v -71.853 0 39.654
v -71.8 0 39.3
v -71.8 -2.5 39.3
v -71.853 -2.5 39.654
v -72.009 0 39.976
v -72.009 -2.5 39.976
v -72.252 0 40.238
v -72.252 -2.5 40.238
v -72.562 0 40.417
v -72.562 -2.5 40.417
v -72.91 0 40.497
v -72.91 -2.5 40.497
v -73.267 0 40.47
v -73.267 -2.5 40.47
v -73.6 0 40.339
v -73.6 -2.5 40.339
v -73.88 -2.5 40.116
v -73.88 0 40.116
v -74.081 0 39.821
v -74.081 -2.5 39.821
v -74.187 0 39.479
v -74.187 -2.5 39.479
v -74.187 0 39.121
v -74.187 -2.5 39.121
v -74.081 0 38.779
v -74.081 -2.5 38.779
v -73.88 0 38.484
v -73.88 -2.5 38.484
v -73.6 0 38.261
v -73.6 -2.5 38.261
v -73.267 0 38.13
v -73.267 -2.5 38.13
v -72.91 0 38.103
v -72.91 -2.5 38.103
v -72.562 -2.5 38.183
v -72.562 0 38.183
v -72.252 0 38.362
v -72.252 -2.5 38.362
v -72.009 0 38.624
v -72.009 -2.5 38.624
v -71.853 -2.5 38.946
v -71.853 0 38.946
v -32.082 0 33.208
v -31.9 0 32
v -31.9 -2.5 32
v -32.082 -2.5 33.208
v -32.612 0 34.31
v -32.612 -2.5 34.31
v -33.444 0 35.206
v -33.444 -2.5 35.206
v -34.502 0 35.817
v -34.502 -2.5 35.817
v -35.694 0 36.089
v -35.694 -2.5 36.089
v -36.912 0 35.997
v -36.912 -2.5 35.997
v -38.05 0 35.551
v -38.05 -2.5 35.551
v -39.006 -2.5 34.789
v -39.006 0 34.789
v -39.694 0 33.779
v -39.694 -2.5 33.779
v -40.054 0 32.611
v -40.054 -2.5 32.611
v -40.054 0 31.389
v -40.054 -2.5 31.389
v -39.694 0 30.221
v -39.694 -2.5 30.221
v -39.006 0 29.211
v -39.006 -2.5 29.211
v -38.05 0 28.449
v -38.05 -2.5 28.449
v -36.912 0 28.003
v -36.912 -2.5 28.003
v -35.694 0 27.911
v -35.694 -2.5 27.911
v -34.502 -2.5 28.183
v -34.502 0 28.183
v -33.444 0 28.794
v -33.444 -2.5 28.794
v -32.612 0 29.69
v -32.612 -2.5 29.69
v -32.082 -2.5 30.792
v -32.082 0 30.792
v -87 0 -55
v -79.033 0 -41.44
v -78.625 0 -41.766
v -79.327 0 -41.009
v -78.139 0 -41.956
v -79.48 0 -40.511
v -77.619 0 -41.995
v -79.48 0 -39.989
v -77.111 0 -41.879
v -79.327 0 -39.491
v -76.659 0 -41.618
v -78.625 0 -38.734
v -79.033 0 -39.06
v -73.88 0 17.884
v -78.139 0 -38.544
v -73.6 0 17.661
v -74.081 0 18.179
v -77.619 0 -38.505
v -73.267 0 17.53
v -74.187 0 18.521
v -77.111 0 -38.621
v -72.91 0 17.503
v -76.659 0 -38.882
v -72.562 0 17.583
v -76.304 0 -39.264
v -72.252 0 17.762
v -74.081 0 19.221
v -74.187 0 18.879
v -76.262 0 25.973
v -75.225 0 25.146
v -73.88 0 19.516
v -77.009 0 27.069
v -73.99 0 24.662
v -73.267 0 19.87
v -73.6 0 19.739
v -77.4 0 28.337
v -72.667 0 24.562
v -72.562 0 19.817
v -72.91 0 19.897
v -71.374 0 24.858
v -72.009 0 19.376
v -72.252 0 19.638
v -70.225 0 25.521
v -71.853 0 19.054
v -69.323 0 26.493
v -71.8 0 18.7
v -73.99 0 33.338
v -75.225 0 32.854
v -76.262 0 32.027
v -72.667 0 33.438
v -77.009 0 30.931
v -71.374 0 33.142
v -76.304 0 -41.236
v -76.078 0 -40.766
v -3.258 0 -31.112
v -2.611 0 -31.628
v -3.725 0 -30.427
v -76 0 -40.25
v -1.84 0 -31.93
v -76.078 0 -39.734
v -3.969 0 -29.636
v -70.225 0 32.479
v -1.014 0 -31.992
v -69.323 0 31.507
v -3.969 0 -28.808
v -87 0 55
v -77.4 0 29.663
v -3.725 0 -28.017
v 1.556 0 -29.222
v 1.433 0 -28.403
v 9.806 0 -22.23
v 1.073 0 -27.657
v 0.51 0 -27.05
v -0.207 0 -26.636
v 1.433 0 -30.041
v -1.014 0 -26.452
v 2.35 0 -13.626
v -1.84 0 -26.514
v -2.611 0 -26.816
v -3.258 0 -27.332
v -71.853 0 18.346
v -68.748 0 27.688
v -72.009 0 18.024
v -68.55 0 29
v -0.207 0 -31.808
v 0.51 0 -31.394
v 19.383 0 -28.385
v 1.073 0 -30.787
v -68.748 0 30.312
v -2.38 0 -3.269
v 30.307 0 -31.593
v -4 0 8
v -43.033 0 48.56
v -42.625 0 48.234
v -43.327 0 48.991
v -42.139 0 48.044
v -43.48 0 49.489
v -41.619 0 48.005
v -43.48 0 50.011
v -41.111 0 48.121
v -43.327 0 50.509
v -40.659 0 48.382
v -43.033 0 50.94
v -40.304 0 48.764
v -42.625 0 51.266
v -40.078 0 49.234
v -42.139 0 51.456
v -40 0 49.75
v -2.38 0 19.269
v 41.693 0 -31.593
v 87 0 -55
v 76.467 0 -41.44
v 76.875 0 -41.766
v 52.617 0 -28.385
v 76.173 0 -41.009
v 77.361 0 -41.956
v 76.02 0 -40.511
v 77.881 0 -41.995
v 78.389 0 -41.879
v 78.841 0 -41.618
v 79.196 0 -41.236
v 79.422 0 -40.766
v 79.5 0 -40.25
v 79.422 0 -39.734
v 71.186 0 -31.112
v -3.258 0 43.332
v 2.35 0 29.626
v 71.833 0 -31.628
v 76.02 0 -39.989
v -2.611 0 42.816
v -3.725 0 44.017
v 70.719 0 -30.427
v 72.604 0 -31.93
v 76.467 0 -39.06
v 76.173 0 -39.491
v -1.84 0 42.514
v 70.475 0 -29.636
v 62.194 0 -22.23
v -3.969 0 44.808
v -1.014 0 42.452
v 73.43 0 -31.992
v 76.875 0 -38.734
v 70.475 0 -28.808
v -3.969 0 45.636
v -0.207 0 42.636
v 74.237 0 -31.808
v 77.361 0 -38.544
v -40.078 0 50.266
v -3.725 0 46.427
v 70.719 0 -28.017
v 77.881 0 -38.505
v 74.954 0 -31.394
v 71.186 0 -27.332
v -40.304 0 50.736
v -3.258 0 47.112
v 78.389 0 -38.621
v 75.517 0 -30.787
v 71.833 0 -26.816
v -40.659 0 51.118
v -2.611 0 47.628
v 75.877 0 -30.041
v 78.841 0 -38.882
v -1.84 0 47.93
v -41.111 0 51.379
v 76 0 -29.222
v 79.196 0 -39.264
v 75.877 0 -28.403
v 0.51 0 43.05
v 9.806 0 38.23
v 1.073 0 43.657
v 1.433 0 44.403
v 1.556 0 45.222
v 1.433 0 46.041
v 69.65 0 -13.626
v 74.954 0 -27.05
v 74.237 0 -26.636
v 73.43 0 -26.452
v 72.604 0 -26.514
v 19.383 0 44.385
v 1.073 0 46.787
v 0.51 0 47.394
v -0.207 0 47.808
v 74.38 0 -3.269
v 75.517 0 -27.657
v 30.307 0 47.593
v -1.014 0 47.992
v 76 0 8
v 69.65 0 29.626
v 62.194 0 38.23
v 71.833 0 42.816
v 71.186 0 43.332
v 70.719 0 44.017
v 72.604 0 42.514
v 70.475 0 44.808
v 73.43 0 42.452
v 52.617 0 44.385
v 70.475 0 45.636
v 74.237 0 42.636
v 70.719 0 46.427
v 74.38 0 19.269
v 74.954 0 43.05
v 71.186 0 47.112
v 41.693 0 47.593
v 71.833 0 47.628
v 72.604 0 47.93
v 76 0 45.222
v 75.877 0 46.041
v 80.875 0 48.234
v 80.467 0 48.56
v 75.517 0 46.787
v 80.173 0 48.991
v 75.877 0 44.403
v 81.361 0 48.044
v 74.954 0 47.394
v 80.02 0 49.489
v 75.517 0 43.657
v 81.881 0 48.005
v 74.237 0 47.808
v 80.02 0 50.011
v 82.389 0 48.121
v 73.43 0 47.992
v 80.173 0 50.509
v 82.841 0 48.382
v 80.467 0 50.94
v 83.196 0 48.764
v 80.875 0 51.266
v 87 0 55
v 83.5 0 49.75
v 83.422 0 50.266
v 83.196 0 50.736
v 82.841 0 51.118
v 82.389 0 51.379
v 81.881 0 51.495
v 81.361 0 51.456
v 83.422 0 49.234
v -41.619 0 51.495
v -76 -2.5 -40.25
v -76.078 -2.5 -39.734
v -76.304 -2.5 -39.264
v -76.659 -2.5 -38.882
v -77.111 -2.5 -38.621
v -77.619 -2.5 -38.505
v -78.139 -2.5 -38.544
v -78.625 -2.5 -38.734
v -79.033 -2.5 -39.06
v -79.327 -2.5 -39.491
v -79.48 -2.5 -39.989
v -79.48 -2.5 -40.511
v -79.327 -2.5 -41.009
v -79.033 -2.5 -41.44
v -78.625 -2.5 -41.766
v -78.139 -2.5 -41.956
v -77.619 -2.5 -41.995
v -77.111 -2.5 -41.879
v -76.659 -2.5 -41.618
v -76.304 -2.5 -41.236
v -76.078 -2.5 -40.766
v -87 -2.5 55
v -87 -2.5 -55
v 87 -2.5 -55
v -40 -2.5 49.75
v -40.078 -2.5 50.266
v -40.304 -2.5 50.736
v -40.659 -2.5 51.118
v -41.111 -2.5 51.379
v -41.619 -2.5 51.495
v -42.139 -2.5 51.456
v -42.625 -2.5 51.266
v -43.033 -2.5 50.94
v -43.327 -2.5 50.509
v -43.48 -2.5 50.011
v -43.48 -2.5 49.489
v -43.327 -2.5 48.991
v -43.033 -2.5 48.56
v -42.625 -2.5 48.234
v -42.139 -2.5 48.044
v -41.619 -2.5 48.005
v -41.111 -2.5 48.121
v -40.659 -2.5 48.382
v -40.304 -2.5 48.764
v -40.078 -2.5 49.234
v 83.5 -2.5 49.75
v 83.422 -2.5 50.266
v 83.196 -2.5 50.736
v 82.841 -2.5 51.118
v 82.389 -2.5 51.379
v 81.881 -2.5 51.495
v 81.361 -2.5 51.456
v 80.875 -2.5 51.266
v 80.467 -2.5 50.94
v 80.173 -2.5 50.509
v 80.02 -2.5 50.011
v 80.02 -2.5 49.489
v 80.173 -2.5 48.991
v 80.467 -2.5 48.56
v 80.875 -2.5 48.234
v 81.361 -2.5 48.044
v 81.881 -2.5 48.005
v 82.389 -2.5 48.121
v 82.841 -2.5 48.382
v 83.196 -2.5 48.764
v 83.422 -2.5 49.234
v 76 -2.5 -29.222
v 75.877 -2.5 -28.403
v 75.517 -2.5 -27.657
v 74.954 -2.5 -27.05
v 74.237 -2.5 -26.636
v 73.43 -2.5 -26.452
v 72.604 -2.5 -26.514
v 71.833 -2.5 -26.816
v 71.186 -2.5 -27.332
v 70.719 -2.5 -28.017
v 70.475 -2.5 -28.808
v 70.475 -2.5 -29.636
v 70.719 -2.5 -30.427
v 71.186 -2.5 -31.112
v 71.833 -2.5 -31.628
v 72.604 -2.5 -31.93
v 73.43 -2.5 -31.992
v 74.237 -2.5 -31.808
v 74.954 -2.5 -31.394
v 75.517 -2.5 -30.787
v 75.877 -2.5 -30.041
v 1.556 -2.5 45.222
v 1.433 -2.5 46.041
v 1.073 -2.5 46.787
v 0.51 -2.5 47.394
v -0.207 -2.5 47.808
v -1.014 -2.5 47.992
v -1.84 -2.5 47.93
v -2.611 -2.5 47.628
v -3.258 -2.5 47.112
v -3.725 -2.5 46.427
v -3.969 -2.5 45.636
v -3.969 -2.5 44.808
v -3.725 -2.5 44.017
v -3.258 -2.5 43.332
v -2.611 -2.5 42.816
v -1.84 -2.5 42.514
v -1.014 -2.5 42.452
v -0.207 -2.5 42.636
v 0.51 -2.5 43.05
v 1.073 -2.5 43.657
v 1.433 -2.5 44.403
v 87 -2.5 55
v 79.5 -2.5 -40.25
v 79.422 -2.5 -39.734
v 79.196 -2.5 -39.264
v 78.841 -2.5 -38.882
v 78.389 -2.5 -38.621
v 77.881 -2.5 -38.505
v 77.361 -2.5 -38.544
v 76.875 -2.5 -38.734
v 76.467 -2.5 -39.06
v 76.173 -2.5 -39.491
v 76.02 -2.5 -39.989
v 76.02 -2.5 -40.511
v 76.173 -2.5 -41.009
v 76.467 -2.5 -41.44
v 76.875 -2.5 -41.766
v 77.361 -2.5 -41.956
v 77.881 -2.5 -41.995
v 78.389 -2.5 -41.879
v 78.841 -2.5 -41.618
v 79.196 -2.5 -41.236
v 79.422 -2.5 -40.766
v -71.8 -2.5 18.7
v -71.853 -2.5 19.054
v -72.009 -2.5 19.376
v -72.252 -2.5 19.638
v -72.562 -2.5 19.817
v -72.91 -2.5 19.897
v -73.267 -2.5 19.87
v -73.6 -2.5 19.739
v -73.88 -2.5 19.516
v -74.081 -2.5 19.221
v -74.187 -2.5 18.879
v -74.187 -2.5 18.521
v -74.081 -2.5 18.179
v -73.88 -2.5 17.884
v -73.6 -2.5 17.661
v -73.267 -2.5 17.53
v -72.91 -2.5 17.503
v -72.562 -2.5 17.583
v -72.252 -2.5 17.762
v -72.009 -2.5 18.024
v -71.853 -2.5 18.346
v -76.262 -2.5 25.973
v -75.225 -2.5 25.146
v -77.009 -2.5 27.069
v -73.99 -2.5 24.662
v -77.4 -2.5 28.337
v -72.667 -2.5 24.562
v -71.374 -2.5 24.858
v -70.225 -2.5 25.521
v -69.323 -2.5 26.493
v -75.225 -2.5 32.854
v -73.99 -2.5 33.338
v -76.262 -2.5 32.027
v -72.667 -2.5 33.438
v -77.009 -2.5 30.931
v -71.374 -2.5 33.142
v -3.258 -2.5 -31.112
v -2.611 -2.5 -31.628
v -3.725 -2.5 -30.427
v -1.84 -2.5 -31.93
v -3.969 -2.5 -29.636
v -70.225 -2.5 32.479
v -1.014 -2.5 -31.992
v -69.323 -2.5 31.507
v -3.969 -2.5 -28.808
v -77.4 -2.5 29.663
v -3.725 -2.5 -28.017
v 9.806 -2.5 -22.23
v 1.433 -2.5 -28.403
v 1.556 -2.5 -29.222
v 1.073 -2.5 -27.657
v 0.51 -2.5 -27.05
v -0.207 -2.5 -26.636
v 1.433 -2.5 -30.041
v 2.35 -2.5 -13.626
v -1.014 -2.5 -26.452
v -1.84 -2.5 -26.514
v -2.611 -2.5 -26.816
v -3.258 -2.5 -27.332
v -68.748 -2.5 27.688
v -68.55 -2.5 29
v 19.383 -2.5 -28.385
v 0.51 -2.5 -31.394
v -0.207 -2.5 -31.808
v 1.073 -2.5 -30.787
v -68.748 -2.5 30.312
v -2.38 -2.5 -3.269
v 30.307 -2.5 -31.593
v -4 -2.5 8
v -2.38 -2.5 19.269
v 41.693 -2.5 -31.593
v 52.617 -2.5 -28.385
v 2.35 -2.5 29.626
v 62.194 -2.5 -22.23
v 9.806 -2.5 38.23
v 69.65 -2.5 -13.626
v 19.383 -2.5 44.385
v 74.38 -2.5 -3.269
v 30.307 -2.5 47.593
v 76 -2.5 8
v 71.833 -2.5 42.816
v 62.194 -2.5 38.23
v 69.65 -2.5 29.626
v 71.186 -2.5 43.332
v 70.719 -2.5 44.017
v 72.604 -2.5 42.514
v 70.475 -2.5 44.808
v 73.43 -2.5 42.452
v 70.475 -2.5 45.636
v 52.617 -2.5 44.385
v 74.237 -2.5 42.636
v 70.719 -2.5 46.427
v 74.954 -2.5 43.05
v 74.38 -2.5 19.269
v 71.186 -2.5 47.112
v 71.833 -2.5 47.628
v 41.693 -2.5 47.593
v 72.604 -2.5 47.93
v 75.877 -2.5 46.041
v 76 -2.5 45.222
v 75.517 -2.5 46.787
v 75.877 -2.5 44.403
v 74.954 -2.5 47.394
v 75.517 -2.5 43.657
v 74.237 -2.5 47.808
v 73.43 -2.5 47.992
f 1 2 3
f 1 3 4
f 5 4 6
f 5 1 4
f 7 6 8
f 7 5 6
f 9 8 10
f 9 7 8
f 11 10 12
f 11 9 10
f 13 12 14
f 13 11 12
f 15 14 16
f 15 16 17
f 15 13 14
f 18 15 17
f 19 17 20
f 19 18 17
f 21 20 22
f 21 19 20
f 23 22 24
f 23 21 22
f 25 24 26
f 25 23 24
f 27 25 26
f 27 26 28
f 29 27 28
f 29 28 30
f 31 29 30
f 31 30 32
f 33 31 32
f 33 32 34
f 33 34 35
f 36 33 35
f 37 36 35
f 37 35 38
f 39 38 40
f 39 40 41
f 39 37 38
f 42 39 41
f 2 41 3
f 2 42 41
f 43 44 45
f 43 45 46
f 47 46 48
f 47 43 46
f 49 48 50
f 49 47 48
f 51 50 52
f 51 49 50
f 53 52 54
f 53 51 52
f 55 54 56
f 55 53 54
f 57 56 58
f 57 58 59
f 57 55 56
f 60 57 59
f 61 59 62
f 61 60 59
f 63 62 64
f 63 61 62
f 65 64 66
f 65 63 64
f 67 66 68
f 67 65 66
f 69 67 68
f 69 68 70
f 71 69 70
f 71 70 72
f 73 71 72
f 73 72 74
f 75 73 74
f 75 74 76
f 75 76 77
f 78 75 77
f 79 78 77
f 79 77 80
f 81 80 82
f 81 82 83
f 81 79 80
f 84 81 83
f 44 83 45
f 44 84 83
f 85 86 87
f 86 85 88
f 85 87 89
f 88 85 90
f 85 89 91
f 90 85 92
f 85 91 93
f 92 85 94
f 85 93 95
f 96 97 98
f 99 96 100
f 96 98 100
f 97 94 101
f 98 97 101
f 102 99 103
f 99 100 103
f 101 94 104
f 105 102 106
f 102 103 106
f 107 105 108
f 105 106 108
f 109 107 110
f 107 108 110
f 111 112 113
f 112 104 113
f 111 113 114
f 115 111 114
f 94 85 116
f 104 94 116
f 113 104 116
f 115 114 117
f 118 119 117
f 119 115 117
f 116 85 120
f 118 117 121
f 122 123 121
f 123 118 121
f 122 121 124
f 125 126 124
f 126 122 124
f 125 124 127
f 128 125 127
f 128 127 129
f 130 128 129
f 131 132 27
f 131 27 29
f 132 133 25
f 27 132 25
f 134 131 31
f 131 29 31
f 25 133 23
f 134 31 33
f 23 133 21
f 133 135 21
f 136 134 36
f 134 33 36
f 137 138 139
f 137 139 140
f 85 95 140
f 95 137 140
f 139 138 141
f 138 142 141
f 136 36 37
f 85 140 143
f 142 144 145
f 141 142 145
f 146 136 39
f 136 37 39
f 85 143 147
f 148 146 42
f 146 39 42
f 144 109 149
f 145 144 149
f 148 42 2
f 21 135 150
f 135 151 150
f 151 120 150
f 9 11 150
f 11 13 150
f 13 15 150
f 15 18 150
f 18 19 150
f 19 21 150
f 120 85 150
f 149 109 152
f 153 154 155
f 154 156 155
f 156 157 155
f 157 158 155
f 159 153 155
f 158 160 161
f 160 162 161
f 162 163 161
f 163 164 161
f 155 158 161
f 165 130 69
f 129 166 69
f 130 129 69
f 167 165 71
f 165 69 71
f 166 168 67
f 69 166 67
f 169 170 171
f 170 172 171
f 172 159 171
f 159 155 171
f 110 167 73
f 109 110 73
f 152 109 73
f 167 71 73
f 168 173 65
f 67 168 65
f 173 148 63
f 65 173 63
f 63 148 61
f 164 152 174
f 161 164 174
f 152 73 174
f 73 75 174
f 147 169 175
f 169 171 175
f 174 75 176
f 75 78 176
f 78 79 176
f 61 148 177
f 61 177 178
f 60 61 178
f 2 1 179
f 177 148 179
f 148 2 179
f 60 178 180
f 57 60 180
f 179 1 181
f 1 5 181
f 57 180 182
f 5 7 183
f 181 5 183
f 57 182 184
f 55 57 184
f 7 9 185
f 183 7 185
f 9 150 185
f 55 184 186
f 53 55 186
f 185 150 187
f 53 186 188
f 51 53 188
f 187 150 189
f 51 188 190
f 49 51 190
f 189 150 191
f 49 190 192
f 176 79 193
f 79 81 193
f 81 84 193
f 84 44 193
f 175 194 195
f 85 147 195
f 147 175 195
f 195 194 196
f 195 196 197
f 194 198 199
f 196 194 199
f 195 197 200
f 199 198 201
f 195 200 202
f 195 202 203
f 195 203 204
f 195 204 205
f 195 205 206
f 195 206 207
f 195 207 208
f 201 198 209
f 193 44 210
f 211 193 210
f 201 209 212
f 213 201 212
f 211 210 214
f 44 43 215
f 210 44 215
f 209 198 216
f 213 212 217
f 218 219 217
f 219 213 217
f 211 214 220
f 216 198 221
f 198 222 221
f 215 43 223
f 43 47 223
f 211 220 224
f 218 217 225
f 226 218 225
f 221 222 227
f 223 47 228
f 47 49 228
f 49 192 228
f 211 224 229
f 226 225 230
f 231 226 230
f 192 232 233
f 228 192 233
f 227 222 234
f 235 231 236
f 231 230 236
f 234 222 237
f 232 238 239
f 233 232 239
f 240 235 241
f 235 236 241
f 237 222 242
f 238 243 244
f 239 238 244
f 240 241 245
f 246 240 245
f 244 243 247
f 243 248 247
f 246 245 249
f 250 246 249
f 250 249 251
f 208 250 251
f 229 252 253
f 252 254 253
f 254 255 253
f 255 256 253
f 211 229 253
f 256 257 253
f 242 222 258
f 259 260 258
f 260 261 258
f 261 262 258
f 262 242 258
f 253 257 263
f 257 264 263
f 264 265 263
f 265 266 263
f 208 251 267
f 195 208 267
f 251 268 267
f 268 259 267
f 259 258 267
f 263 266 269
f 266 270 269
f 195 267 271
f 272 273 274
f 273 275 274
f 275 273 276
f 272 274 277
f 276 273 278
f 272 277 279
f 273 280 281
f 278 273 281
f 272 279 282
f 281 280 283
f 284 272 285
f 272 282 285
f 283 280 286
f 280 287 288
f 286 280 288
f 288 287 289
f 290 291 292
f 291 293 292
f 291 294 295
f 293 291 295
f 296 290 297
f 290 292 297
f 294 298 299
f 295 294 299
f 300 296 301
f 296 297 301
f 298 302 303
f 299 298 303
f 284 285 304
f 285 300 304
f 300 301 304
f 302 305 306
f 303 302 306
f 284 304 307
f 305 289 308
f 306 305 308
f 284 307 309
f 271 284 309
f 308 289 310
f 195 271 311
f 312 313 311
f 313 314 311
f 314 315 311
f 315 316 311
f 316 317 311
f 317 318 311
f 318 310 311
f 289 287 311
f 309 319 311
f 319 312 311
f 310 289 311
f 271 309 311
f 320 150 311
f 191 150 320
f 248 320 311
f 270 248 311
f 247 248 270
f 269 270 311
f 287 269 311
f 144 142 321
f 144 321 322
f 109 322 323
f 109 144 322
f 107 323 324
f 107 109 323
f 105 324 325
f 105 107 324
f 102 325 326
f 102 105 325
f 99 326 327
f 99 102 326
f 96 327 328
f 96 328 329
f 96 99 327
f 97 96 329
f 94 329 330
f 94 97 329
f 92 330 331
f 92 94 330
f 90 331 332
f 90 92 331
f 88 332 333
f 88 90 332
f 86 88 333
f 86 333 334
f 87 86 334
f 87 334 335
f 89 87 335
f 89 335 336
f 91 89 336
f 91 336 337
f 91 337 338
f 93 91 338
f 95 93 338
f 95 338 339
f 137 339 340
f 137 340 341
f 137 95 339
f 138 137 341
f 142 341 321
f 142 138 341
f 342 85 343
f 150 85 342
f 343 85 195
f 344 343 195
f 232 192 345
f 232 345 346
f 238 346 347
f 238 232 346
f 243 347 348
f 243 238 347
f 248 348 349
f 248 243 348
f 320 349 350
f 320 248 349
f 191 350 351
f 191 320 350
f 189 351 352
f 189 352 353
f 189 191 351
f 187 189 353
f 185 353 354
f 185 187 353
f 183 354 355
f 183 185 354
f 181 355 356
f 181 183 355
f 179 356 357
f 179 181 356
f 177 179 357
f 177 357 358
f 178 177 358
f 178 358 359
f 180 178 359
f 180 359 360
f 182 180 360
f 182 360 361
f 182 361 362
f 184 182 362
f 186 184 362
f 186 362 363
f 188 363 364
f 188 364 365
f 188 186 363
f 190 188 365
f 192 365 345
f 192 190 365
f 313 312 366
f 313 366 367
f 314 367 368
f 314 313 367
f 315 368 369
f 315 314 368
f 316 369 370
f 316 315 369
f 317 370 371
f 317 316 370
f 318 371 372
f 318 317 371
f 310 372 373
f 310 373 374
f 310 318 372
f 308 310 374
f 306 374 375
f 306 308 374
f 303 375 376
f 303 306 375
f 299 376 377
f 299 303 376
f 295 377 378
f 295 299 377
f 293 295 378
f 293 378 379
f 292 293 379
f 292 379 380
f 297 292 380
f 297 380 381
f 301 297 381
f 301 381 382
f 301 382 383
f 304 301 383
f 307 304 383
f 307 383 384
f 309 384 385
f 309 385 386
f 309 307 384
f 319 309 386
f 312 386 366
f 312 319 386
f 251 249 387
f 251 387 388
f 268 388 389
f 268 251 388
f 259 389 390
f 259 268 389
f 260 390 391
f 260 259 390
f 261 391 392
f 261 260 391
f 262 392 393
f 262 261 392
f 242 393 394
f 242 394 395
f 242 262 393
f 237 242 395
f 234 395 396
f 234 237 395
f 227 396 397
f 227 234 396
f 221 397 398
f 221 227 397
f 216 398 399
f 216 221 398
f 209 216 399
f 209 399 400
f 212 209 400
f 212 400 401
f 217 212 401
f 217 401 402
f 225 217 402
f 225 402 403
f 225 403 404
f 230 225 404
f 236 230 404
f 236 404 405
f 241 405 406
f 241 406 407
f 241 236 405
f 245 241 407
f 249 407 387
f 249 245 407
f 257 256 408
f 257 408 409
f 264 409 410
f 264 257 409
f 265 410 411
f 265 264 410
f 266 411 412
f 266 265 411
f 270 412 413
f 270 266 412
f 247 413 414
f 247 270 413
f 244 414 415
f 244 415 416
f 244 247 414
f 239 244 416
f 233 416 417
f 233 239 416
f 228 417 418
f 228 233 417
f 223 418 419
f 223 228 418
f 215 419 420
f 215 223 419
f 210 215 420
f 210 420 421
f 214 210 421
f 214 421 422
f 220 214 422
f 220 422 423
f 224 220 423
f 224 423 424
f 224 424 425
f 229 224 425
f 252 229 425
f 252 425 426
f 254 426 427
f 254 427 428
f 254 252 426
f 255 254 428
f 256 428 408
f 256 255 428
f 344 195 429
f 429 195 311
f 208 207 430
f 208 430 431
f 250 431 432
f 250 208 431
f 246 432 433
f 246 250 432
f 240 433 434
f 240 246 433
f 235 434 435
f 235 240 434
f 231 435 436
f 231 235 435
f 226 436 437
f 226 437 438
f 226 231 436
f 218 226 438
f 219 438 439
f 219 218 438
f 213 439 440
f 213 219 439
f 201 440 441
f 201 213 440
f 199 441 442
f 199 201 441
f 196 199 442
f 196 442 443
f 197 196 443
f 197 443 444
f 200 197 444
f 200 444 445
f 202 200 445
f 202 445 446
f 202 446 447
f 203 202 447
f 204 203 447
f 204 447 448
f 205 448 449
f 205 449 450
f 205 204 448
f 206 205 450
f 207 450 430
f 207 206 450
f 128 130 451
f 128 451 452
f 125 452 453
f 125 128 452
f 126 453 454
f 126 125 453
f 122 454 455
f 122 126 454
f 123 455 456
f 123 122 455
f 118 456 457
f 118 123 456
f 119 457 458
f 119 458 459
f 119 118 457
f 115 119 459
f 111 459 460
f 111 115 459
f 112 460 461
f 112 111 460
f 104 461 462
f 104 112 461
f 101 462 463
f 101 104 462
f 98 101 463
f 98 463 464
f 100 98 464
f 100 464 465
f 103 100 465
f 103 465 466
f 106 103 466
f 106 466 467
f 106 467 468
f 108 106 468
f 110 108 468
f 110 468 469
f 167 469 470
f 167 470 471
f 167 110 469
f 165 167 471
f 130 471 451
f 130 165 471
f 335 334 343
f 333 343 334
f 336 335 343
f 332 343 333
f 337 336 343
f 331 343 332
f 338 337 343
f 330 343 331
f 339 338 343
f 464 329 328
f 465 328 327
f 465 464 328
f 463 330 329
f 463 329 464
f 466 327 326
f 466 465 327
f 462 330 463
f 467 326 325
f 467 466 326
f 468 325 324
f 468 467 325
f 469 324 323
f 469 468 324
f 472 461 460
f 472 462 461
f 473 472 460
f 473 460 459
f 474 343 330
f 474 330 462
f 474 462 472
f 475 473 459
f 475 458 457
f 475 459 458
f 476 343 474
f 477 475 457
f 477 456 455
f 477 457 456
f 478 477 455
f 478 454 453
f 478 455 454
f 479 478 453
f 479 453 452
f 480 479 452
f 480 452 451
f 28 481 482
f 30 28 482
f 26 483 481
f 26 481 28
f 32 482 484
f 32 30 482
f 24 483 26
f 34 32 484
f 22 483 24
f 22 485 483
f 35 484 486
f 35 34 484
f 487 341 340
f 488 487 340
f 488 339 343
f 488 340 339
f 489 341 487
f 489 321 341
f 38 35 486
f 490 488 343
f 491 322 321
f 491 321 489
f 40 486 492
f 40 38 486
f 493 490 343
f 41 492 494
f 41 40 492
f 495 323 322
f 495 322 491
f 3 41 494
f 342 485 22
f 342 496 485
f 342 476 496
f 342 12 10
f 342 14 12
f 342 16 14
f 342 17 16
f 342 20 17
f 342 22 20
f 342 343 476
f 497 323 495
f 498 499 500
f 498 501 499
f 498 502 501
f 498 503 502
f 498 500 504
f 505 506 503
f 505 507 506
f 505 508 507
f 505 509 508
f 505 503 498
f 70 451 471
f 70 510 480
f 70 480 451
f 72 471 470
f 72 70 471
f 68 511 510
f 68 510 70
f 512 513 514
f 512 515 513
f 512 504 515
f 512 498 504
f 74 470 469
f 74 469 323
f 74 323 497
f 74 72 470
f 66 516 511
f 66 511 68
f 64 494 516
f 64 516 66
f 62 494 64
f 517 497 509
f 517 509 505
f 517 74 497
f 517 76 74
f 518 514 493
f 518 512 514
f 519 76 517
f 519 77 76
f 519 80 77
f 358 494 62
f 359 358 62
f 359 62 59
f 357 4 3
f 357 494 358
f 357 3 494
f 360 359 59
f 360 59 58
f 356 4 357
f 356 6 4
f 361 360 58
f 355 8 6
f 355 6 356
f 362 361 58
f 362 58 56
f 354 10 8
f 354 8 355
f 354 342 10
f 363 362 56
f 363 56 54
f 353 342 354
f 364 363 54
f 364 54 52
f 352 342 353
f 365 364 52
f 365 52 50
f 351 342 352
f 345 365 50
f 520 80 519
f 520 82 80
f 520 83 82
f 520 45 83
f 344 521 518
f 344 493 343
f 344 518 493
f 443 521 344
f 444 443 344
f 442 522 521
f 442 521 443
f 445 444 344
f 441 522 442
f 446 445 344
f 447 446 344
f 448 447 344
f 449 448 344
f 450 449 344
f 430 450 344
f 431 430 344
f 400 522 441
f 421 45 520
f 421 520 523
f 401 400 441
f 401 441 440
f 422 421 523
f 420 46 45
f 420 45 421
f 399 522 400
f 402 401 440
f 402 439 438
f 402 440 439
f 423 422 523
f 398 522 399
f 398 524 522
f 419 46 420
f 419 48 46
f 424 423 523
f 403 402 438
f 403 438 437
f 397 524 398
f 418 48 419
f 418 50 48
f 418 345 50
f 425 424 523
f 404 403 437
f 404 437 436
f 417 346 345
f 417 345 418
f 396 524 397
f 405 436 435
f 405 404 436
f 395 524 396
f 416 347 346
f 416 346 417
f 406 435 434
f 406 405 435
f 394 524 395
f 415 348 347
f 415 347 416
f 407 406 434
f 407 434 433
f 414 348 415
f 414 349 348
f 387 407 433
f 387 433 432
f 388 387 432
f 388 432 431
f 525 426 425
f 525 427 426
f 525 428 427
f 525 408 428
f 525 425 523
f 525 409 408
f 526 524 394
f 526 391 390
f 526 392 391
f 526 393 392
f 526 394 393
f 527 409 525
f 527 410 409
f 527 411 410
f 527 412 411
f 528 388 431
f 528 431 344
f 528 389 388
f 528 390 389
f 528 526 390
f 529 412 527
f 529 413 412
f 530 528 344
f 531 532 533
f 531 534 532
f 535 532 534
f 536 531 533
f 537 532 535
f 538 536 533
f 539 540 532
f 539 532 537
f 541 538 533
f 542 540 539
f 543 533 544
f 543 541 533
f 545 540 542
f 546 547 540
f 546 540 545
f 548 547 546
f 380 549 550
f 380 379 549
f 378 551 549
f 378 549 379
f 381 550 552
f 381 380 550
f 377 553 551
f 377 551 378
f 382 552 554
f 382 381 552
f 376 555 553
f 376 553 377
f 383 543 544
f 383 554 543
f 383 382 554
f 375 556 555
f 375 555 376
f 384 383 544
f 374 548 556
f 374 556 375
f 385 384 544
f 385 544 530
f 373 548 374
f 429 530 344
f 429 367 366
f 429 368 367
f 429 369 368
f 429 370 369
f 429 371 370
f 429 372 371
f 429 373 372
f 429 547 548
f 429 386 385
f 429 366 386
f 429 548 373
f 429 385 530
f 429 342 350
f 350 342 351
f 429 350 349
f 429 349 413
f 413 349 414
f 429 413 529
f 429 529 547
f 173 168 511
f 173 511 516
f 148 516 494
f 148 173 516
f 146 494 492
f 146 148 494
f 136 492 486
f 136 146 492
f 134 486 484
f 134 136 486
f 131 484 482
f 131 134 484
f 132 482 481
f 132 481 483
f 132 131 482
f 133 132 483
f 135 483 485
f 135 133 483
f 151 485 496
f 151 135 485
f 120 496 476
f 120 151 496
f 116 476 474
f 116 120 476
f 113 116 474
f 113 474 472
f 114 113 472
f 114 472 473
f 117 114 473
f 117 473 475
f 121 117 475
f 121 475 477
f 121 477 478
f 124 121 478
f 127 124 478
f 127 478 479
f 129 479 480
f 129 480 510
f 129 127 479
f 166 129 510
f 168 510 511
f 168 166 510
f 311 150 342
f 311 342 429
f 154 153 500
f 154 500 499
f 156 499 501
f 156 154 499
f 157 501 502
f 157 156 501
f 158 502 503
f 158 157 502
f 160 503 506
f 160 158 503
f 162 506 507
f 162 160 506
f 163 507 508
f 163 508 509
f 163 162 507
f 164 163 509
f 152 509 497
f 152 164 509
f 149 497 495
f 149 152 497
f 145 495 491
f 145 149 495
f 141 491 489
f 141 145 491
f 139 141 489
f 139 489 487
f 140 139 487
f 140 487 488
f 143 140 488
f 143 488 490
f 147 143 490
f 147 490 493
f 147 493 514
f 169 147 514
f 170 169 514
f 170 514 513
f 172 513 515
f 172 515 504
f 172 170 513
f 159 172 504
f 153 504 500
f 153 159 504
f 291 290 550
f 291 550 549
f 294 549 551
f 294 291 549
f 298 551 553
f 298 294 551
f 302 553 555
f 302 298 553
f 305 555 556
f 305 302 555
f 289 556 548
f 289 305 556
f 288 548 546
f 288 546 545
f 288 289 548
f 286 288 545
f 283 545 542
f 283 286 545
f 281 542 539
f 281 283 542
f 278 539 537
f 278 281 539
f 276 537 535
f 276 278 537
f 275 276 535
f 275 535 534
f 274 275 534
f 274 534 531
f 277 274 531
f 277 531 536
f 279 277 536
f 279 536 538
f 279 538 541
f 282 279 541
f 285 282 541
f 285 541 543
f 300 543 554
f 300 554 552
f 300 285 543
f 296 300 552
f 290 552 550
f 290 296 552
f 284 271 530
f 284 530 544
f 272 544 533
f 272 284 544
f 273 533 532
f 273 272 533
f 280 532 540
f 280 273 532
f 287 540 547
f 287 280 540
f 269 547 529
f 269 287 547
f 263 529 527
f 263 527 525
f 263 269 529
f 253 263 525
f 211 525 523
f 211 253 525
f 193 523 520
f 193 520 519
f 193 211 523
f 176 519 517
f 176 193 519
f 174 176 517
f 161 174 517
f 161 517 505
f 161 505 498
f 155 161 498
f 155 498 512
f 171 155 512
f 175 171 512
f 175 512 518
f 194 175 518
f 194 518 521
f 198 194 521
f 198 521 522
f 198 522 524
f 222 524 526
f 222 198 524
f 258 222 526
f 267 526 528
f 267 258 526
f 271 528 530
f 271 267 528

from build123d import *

# Parameters (mm, degrees)
F0_W     = 174
F0_H     = 110
F0_R     = 1.75
F0_R_2   = 2.778
F0_R_3   = 1.2
F0_R_4   = 4.45
F0_R_5   = 4.1
F0_R_6   = 40
F1_DEPTH = 2.5


# Not quite as in the source:
# - a feature names something its author has since deleted; it is built from what else it names


with BuildPart() as f1:
    # F0 (on Front) → F1 (new body)
    with BuildSketch(Plane.XZ):
        Rectangle(F0_W, F0_H)
        with Locations((-77.75, -40.25)):
            Circle(F0_R, mode=Mode.SUBTRACT)
        with Locations((-1.222, -29.222)):
            Circle(F0_R_2, mode=Mode.SUBTRACT)
        with Locations((77.75, -40.25)):
            Circle(F0_R, mode=Mode.SUBTRACT)
        with Locations((73.222, -29.222)):
            Circle(F0_R_2, mode=Mode.SUBTRACT)
        with Locations((-73, 18.7)):
            Circle(F0_R_3, mode=Mode.SUBTRACT)
        with Locations((-73, 29)):
            Circle(F0_R_4, mode=Mode.SUBTRACT)
        with Locations((-73, 39.3)):
            Circle(F0_R_3, mode=Mode.SUBTRACT)
        with Locations((-36, 32)):
            Circle(F0_R_5, mode=Mode.SUBTRACT)
        with Locations((-41.75, 49.75)):
            Circle(F0_R, mode=Mode.SUBTRACT)
        with Locations((-1.222, 45.222)):
            Circle(F0_R_2, mode=Mode.SUBTRACT)
        with Locations((36, 8)):
            Circle(F0_R_6, mode=Mode.SUBTRACT)
        with Locations((73.222, 45.222)):
            Circle(F0_R_2, mode=Mode.SUBTRACT)
        with Locations((81.75, 49.75)):
            Circle(F0_R, mode=Mode.SUBTRACT)
    extrude(amount=F1_DEPTH)


solid = f1.part
